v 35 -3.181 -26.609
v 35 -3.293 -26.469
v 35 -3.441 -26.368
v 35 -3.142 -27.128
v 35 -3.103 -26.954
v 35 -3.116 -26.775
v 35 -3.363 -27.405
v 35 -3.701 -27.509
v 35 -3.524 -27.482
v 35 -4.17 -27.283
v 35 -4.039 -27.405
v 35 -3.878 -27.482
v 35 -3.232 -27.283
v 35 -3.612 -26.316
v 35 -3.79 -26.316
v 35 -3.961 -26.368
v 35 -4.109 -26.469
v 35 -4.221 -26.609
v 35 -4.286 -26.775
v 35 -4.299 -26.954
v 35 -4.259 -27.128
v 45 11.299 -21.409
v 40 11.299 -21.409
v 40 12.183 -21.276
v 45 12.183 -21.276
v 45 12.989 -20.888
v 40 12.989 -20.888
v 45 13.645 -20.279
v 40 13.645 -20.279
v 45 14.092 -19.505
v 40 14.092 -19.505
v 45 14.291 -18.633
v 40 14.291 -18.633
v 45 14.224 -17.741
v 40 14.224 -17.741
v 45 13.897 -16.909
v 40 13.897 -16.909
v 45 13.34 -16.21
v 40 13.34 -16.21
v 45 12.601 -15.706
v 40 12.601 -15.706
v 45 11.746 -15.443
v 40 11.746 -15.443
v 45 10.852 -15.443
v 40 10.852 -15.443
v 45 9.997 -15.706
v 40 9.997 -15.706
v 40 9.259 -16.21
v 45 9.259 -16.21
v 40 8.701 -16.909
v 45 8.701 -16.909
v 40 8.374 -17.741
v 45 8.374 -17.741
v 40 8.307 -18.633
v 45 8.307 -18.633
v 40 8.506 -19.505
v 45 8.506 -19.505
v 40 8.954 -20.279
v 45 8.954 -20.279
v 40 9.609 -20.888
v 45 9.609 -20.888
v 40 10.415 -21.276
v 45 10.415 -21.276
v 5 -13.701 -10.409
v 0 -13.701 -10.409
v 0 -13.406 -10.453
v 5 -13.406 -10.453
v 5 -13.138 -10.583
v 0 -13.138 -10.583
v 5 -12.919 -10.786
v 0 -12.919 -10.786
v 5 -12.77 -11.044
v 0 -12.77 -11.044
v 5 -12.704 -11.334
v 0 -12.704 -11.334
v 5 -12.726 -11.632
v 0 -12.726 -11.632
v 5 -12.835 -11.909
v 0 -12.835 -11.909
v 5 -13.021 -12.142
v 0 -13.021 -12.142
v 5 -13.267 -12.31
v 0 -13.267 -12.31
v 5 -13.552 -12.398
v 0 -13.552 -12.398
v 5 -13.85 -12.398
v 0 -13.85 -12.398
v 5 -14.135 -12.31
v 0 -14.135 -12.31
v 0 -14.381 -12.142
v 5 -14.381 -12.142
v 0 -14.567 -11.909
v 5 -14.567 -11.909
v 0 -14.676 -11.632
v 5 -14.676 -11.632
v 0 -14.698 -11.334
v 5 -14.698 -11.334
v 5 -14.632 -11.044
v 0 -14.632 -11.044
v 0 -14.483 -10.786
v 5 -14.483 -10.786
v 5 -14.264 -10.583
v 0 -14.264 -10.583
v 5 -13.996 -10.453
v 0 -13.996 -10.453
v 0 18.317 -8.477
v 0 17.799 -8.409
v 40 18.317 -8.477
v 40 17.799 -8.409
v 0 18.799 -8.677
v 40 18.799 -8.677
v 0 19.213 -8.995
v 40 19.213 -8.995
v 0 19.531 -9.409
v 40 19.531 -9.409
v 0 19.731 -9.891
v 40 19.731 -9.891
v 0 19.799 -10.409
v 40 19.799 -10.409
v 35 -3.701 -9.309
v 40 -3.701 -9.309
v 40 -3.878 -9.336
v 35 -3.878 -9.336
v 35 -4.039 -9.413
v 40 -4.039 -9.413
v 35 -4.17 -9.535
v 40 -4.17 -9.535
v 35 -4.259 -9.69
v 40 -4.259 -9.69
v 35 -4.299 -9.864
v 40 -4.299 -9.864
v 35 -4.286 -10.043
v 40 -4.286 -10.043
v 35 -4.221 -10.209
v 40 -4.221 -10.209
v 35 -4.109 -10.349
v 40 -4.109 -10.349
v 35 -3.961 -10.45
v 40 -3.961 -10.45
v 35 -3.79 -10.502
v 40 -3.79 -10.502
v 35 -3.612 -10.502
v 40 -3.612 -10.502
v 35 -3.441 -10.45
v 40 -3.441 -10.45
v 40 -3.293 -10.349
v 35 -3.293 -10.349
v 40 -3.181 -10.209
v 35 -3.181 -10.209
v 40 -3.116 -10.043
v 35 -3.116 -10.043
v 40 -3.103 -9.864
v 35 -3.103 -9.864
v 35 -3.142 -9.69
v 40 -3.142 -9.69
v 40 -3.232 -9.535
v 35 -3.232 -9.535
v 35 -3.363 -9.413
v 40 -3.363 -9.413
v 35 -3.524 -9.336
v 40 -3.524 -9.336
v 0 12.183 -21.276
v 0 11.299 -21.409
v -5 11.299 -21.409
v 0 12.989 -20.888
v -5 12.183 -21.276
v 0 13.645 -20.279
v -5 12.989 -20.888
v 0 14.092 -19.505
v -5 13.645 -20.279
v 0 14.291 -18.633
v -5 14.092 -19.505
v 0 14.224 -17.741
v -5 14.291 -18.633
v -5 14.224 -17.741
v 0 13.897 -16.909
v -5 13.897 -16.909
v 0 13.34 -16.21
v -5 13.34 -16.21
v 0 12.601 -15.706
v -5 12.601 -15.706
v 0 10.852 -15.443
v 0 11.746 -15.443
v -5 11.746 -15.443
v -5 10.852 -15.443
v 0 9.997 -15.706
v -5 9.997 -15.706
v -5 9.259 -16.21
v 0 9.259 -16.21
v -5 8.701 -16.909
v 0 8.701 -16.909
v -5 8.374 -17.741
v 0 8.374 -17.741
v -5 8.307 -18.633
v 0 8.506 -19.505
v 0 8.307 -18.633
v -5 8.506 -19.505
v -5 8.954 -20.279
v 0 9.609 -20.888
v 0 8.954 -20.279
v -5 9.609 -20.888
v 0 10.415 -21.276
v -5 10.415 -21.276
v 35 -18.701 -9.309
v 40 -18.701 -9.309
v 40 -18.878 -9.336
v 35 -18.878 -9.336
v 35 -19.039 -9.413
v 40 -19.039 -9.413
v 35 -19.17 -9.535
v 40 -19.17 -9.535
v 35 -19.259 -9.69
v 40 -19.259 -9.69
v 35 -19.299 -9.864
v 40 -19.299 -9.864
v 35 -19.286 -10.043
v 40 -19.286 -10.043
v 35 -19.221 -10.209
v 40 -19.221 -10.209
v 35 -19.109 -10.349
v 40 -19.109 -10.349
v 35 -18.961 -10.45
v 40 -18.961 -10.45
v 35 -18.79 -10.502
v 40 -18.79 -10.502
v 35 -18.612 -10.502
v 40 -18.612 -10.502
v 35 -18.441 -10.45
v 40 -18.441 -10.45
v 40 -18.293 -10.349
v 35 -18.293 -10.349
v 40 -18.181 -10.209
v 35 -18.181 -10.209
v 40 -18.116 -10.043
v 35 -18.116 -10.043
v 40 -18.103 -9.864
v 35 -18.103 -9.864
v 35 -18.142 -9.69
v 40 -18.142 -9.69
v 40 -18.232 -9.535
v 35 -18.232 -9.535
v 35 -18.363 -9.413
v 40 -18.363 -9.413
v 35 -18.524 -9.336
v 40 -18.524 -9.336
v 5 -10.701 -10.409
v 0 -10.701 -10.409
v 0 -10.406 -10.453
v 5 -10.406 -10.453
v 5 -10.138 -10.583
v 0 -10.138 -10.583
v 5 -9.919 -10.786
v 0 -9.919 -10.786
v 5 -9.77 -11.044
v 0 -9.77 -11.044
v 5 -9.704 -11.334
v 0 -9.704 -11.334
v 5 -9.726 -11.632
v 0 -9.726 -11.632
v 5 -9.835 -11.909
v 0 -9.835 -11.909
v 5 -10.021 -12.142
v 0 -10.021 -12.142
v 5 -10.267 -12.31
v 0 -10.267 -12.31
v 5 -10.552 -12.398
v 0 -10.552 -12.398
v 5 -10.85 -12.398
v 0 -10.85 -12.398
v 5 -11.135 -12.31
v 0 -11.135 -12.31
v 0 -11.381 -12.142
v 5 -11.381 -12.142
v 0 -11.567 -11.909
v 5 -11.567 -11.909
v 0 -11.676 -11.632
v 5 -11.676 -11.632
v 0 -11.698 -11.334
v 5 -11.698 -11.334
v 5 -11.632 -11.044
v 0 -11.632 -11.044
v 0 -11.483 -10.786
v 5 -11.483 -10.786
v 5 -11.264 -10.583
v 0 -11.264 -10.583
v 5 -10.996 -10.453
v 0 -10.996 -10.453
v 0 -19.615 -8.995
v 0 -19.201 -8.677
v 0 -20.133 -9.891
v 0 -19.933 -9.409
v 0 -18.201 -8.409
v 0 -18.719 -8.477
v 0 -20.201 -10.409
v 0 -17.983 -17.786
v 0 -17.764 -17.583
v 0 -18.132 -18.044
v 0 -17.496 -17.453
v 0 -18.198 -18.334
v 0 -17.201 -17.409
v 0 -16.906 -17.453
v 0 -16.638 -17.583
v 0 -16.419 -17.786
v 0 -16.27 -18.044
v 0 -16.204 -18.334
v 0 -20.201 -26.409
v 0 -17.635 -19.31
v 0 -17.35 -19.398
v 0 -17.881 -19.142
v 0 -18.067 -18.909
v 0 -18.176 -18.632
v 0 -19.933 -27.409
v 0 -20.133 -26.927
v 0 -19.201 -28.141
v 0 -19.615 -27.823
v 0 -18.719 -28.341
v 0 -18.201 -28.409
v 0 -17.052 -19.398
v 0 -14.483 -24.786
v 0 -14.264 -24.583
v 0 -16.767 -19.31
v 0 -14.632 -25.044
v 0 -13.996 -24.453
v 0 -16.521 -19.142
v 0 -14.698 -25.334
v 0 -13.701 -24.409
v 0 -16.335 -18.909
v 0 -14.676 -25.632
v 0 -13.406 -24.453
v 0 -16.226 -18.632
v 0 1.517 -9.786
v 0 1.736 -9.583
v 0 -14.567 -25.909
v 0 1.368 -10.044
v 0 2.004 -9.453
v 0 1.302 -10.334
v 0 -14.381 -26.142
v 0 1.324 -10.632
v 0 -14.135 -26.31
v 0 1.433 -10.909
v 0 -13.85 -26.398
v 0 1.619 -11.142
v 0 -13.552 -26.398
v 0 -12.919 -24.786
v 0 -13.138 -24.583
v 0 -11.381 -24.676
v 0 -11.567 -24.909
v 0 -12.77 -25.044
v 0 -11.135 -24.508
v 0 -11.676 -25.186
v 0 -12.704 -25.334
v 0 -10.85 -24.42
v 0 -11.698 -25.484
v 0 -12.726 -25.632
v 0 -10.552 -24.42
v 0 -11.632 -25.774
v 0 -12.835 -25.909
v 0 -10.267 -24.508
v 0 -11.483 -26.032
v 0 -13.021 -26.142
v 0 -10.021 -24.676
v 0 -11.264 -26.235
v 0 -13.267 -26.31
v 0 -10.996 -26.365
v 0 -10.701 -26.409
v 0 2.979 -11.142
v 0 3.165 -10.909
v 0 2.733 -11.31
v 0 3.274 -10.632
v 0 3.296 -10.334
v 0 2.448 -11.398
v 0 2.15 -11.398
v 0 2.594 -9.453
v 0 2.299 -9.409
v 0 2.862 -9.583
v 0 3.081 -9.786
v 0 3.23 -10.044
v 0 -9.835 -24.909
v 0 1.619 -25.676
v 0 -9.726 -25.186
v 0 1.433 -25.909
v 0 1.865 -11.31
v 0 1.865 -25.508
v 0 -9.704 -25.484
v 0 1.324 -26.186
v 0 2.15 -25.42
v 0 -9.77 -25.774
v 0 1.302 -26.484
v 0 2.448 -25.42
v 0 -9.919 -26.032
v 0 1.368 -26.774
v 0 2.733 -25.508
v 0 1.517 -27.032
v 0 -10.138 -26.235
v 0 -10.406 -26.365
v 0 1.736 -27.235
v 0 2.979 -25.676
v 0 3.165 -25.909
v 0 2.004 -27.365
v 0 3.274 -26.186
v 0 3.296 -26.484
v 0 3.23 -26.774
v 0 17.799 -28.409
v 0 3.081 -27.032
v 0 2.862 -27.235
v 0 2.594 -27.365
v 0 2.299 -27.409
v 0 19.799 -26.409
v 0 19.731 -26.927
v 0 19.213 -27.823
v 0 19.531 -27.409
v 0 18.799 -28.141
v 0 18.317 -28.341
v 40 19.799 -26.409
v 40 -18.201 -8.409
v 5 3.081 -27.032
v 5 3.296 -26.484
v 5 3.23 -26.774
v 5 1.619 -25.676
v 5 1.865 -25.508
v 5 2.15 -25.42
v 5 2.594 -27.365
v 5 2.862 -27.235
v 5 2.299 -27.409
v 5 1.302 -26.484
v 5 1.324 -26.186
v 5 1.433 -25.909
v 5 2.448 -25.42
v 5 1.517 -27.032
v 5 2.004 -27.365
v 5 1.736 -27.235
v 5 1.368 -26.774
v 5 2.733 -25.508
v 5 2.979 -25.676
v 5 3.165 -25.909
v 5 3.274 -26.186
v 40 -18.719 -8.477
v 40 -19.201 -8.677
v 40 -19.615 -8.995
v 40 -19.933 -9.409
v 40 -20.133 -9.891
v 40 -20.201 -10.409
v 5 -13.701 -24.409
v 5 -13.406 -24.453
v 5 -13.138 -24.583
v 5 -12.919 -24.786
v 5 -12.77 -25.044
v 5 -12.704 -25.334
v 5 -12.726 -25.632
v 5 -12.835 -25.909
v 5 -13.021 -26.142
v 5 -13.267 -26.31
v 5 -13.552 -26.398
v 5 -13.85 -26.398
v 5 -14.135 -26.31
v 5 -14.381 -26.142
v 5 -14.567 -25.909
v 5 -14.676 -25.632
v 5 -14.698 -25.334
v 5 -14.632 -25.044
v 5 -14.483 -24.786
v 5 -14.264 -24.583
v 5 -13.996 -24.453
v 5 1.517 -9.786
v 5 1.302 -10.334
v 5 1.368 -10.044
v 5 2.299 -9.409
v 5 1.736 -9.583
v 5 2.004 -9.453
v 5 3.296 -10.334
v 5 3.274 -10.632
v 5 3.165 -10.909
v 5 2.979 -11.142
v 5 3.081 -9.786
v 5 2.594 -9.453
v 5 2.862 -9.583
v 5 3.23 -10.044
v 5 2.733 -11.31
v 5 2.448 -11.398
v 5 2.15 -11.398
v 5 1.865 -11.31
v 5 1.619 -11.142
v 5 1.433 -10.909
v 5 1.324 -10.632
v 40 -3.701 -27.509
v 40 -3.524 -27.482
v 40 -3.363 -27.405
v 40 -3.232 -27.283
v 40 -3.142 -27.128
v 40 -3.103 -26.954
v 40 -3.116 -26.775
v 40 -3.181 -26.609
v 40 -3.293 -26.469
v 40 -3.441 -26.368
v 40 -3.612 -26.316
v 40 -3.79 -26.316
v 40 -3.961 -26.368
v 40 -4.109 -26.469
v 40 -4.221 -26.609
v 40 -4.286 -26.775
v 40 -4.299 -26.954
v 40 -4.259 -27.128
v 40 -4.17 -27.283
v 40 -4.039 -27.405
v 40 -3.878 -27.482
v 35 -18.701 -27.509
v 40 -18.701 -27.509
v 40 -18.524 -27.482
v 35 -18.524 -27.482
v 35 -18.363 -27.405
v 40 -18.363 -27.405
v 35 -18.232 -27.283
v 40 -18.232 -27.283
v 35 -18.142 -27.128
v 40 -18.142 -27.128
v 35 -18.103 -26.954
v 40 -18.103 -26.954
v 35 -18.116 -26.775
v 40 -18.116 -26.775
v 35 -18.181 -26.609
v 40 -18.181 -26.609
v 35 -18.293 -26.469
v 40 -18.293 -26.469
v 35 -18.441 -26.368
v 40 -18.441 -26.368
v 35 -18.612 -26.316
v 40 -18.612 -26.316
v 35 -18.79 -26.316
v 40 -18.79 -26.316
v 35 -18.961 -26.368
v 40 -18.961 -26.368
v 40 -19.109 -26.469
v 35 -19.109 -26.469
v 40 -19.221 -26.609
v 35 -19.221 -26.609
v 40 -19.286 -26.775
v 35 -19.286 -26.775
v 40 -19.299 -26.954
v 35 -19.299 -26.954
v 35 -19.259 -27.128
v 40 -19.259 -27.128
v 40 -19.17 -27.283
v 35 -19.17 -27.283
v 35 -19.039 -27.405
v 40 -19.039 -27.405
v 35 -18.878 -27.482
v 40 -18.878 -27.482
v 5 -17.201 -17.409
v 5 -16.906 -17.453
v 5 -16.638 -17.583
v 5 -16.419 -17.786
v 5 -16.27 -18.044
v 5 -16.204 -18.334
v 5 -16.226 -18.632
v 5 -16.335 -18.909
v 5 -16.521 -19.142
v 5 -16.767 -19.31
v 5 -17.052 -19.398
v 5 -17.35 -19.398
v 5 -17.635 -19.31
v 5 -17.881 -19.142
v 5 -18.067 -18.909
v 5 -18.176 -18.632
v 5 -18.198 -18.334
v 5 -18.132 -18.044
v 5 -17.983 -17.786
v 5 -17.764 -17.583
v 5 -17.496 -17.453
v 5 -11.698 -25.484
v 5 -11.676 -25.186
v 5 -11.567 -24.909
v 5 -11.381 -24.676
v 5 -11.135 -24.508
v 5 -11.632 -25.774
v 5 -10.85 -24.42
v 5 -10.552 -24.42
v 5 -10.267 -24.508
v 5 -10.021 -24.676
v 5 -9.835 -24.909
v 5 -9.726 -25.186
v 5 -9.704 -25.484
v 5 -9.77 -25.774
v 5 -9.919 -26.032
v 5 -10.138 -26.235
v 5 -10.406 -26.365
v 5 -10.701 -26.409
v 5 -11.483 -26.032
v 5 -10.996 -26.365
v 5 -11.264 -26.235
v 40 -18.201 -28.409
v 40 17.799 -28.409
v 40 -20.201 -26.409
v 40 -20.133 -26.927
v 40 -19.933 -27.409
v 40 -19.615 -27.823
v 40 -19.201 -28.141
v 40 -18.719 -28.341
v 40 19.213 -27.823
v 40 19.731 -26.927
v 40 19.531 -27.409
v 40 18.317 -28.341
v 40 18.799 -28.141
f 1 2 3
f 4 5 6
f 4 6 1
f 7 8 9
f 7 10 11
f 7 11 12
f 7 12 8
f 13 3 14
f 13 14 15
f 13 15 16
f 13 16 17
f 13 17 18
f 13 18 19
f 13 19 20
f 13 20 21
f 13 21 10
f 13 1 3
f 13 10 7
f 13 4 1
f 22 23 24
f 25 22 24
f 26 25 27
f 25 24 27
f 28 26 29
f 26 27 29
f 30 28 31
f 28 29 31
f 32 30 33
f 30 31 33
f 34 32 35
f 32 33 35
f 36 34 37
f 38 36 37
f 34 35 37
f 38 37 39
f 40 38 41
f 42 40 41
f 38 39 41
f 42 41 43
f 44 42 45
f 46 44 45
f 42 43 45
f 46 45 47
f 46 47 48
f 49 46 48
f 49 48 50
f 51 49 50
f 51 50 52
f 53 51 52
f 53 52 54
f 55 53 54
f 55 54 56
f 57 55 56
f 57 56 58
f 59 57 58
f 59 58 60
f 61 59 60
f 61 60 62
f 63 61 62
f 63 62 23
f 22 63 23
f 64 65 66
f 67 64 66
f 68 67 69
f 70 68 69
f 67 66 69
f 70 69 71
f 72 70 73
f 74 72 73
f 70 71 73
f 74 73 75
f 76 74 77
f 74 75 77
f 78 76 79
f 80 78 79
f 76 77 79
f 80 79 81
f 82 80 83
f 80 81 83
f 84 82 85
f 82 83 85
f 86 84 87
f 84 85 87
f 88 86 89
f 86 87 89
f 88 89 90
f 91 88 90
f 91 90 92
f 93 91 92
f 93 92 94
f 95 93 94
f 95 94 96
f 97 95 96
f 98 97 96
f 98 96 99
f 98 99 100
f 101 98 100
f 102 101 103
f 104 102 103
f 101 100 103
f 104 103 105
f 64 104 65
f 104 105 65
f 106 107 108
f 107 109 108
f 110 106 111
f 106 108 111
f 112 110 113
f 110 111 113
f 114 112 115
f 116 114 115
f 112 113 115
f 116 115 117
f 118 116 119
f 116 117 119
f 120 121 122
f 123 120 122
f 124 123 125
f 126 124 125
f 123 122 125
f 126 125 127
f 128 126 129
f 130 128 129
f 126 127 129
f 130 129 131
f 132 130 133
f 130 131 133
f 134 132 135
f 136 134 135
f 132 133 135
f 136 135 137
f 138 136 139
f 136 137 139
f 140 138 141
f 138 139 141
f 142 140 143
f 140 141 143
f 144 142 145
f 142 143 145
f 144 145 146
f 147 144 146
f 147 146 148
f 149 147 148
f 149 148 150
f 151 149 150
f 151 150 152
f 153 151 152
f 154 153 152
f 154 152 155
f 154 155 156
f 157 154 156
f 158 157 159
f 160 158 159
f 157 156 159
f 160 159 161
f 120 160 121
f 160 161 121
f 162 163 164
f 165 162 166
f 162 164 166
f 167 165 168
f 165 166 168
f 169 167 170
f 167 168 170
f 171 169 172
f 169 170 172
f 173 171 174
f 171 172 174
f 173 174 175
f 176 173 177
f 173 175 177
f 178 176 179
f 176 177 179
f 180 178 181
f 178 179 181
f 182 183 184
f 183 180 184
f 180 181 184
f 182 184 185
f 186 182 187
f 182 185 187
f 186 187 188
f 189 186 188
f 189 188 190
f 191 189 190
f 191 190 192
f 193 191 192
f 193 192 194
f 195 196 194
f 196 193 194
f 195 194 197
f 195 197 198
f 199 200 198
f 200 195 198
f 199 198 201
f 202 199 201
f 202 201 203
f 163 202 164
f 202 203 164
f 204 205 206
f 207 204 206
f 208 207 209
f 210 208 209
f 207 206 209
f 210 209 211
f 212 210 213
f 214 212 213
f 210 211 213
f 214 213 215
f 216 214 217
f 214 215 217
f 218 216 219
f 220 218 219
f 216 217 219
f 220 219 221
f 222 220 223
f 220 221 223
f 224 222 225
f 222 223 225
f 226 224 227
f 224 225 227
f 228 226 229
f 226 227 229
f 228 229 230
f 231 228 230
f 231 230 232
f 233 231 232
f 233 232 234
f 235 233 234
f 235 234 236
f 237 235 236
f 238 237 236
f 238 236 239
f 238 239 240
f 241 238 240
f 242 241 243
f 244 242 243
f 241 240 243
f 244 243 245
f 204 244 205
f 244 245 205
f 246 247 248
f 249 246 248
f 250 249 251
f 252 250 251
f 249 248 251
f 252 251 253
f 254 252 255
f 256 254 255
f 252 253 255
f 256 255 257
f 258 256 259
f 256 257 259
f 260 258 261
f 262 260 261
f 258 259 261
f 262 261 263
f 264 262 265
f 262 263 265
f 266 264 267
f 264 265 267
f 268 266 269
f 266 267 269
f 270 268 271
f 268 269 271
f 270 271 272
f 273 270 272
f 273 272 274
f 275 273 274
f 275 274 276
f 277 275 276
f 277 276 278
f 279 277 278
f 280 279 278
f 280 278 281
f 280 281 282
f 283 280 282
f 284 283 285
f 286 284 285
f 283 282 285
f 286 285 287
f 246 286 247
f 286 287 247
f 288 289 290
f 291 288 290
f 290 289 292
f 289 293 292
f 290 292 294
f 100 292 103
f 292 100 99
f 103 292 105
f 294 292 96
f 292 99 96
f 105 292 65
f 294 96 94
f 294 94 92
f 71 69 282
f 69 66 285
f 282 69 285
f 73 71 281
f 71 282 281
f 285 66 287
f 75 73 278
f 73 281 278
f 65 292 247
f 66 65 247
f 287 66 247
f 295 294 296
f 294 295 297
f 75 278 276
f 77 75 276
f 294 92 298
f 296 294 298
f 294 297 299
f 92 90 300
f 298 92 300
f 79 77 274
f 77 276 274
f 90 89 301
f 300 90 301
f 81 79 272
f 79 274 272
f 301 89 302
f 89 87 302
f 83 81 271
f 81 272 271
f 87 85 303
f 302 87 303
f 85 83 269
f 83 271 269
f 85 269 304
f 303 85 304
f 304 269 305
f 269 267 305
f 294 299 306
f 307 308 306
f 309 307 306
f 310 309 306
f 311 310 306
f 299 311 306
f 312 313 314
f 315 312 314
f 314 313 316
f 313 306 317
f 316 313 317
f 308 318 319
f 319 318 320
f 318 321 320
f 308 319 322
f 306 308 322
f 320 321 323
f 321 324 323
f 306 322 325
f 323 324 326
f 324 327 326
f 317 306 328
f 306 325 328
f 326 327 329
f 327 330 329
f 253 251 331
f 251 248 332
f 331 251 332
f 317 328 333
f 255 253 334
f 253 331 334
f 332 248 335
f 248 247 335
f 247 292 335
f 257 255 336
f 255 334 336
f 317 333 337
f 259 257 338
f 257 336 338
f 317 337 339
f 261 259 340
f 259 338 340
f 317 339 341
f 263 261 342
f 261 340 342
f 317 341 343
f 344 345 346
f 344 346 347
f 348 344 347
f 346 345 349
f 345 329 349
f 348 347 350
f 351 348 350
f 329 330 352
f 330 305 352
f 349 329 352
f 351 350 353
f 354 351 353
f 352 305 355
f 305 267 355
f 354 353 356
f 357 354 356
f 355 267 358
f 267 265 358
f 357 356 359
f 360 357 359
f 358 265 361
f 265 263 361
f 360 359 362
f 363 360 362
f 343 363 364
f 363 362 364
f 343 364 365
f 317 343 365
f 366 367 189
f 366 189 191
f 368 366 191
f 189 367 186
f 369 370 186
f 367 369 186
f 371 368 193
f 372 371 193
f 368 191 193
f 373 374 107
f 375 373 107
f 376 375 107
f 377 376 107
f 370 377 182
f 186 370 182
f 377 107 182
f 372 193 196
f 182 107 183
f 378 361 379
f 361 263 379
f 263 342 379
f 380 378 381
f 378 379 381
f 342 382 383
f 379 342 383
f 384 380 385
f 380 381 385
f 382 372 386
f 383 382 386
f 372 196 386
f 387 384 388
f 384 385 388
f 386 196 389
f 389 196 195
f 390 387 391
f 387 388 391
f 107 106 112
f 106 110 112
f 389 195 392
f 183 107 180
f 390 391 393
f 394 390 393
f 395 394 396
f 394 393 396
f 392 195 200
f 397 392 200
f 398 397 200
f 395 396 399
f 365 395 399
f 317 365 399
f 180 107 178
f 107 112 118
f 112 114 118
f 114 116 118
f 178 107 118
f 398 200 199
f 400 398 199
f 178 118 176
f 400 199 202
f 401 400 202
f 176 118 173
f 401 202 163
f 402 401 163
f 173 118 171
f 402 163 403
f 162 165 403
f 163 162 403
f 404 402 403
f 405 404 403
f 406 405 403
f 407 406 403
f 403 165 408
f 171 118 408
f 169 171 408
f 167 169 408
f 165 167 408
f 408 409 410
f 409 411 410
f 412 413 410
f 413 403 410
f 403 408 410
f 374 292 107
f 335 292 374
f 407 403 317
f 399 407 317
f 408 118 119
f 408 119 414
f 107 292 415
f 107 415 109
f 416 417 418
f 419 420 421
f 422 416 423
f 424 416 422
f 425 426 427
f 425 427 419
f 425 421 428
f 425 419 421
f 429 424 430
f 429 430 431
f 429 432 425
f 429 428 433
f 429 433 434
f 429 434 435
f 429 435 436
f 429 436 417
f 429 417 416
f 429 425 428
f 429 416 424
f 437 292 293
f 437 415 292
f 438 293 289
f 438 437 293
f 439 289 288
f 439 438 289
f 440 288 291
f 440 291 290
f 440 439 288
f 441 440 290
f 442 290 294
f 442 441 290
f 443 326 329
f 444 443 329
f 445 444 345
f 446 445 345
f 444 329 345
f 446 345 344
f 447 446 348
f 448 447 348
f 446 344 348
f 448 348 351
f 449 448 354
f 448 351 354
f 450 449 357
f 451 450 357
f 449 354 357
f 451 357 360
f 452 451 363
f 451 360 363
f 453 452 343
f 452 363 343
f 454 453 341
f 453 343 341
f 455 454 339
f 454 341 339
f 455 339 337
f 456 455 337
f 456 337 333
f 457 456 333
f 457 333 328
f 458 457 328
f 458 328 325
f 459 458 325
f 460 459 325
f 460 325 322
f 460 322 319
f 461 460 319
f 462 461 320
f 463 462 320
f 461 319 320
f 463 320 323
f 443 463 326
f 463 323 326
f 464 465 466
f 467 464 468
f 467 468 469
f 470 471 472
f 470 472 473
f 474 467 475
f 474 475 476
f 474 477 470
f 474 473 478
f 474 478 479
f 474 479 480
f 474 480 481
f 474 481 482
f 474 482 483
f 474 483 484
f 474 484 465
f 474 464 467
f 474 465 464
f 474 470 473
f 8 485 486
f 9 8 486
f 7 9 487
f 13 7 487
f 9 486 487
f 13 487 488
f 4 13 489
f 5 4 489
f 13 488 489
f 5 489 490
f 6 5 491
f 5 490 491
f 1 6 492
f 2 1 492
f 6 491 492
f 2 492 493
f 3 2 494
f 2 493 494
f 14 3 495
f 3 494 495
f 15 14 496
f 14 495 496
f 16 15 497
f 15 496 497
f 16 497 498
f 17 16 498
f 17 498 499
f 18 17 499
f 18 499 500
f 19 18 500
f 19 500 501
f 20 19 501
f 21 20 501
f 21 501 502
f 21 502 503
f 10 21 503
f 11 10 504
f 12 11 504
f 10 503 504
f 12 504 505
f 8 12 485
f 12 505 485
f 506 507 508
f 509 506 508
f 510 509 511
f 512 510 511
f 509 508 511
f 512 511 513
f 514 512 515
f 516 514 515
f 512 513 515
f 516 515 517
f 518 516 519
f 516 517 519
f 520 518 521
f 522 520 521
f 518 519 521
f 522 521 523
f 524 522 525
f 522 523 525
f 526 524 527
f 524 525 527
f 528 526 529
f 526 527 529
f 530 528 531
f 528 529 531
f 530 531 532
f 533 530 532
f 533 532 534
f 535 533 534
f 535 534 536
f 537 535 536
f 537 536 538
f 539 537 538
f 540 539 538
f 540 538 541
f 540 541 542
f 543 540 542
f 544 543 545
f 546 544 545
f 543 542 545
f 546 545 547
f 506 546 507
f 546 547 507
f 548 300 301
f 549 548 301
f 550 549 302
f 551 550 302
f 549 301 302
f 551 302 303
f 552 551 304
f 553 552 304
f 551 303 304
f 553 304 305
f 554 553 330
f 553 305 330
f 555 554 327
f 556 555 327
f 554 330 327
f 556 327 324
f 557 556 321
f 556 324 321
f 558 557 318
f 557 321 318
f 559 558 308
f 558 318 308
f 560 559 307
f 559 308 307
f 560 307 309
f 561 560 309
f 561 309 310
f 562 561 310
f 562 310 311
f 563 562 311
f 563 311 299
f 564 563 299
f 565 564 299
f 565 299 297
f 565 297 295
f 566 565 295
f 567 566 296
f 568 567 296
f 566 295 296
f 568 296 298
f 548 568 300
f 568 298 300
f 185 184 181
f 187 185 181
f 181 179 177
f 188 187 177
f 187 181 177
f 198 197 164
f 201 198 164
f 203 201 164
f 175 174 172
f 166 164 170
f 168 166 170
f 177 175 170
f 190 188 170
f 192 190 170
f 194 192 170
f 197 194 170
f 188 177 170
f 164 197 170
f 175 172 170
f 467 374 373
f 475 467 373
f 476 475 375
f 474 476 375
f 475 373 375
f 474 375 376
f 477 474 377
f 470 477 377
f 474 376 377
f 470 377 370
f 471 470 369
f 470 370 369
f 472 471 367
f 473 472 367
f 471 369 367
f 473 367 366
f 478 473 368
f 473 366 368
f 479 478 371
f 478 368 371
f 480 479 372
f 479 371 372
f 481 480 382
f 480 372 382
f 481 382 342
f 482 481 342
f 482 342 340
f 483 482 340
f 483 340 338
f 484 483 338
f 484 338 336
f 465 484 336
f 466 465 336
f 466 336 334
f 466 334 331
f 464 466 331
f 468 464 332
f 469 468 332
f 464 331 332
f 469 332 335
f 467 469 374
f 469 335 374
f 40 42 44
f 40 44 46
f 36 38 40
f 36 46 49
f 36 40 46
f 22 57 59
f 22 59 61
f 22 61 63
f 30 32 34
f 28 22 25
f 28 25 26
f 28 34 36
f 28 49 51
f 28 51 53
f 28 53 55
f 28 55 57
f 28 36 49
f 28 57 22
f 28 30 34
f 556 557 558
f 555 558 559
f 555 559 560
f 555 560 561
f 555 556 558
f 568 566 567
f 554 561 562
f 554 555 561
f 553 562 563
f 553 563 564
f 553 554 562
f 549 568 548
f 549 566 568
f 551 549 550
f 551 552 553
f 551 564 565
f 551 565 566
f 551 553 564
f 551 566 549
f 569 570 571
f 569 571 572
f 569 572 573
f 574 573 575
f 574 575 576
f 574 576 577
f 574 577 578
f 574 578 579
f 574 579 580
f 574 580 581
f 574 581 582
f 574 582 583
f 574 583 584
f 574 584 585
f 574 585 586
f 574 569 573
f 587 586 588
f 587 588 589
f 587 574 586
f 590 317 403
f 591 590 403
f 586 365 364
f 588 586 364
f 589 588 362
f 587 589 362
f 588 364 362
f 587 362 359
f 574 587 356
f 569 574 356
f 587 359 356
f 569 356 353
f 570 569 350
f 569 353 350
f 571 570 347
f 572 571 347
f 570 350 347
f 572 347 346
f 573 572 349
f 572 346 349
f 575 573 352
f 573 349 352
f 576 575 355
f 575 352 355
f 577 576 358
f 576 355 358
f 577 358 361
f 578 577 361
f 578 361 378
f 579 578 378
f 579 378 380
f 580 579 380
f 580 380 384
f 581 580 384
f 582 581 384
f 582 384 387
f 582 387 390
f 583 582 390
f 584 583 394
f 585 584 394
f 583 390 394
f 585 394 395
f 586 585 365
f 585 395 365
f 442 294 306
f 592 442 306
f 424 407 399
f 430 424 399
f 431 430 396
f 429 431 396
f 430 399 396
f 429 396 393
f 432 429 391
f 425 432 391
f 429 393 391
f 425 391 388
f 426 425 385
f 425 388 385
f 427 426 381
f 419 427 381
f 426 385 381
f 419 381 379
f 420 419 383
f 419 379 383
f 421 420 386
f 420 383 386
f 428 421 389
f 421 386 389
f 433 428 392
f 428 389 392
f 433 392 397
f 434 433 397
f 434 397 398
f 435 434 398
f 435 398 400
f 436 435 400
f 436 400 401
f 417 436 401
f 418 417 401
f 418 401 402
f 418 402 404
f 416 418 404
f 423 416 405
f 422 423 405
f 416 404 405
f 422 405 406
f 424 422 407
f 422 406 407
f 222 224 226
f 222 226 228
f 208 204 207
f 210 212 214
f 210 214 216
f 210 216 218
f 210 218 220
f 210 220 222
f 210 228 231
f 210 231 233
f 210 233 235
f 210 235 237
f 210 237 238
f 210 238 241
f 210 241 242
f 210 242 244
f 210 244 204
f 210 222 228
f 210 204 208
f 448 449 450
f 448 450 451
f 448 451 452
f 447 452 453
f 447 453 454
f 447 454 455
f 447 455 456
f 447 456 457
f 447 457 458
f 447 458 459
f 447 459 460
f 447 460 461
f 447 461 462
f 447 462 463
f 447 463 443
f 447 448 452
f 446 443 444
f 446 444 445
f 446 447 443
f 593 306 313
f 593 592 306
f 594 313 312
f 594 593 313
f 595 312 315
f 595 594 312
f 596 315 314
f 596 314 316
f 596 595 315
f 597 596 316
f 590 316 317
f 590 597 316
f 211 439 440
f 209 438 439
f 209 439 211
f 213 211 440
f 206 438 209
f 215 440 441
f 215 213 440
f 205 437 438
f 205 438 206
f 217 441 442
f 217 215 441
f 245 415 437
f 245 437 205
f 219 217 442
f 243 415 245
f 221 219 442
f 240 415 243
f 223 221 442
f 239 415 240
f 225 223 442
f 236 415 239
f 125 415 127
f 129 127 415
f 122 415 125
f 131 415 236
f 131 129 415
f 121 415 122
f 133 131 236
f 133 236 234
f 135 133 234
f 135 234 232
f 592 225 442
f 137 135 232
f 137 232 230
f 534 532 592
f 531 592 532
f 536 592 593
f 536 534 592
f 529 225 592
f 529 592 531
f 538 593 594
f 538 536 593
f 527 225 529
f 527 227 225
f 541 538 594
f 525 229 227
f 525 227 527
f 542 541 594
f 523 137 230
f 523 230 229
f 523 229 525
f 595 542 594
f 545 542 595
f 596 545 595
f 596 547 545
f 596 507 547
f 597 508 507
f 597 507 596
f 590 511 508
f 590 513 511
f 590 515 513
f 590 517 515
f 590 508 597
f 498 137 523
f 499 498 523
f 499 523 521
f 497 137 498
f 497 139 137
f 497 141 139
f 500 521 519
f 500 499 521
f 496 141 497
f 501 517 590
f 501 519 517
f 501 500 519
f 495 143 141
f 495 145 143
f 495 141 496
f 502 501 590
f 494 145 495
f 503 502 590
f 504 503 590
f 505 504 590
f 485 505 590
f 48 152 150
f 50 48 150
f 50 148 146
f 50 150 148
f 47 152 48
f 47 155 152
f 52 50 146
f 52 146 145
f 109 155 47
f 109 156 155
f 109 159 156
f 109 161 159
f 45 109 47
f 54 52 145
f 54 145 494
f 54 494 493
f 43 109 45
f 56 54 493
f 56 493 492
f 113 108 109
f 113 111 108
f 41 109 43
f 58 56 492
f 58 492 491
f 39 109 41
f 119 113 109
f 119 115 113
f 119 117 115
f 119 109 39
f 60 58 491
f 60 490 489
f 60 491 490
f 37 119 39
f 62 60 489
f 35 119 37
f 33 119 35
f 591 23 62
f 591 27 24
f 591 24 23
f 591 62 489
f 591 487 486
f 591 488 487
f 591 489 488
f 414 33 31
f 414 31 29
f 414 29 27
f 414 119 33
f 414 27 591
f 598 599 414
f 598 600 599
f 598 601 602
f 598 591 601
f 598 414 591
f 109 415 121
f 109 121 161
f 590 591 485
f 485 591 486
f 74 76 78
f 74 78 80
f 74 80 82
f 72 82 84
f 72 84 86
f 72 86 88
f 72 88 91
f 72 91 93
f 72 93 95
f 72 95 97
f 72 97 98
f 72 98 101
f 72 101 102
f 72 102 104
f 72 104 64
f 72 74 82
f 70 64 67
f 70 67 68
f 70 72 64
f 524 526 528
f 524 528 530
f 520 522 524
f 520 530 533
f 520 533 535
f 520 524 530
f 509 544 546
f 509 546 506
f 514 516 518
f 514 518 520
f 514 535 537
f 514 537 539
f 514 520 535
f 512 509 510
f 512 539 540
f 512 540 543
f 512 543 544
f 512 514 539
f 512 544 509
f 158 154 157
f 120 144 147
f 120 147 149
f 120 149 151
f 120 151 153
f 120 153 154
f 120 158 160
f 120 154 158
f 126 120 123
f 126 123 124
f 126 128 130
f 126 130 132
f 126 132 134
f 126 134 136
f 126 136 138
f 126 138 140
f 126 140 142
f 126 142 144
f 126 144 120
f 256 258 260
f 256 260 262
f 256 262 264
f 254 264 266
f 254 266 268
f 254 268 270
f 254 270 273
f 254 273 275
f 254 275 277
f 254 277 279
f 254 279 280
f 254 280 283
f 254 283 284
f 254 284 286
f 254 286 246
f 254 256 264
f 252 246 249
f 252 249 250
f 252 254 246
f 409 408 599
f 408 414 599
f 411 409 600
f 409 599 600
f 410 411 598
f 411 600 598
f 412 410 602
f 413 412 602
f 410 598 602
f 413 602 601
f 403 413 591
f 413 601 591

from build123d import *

# Parameters (mm, degrees)
SKETCH_1_W           = 20
SKETCH_1_H           = 40
EXTRUDE_1_DEPTH      = 40
SKETCH_2_R           = 0.6
CUT_EXTRUDE_1_DEPTH  = 5
EXTRUDE_3_DEPTH      = 5
EXTRUDE_3_DEPTH_BACK = 45
SKETCH_3_R           = 3
SKETCH_4_R           = 1
CUT_EXTRUDE_2_DEPTH  = 5
FILLET_1_R           = 2


with BuildPart() as part:
    # ｽｹｯﾁ1 → ﾎﾞｽ - 押し出し1 (new body)
    with BuildSketch(Plane(origin=(0, 0, 0), x_dir=(0, 0, -1), z_dir=(1, 0, 0))):
        with Locations((18.409001804, -0.200935369)):
            Rectangle(SKETCH_1_W, SKETCH_1_H)
    extrude(amount=EXTRUDE_1_DEPTH)

    # ｽｹｯﾁ2 → ｶｯﾄ - 押し出し1 (cut)
    with BuildSketch(Plane(origin=(40, 0, 0), x_dir=(0, 0, -1), z_dir=(1, 0, 0))):
        with Locations((26.909001804, -18.700935369)):
            Circle(SKETCH_2_R)
        with Locations((26.909001804, -3.700935369)):
            Circle(SKETCH_2_R)
        with Locations(Location((9.909001804, -3.700935369, 0), (0, 0, 180))):
            Circle(SKETCH_2_R)
        with Locations(Location((9.909001804, -18.700935369, 0), (0, 0, 180))):
            Circle(SKETCH_2_R)
    extrude(amount=-CUT_EXTRUDE_1_DEPTH, mode=Mode.SUBTRACT)

    # ｽｹｯﾁ3 → ﾎﾞｽ - 押し出し3 (add, two sides: drawn at the far end of the back side and taken through both)
    with BuildSketch(Plane(origin=(40, 0, 0), x_dir=(0, 0, -1), z_dir=(1, 0, 0)).offset(-EXTRUDE_3_DEPTH_BACK)):
        with Locations((18.409001804, 11.299064631)):
            Circle(SKETCH_3_R)
    extrude(amount=EXTRUDE_3_DEPTH + EXTRUDE_3_DEPTH_BACK)

    # ｽｹｯﾁ4 → ｶｯﾄ - 押し出し2 (cut)
    with BuildSketch(Plane.ZY):
        with Locations((-11.409001804, -13.700935369)):
            Circle(SKETCH_4_R)
        with Locations((-25.409001804, -13.700935369)):
            Circle(SKETCH_4_R)
        with Locations(Location((-26.409001804, 2.299064631, 0), (0, 0, 180))):
            Circle(SKETCH_4_R)
        with Locations((-10.409001804, 2.299064631)):
            Circle(SKETCH_4_R)
        with Locations((-11.409001804, -10.700935369)):
            Circle(SKETCH_4_R)
        with Locations(Location((-25.409001804, -10.700935369, 0), (0, 0, 180))):
            Circle(SKETCH_4_R)
        with Locations((-18.409001804, -17.200935369)):
            Circle(SKETCH_4_R)
    extrude(amount=-CUT_EXTRUDE_2_DEPTH, mode=Mode.SUBTRACT)

    # ﾌｨﾚｯﾄ1
    fillet_1_edges = [part.edges().sort_by_distance(p)[0] for p in [
        (20, 19.799064631, -8.409001804),
        (20, 19.799064631, -28.409001804),
        (20, -20.200935369, -28.409001804),
        (20, -20.200935369, -8.409001804),
    ]]
    fillet(fillet_1_edges, radius=FILLET_1_R)


solid = part.part
